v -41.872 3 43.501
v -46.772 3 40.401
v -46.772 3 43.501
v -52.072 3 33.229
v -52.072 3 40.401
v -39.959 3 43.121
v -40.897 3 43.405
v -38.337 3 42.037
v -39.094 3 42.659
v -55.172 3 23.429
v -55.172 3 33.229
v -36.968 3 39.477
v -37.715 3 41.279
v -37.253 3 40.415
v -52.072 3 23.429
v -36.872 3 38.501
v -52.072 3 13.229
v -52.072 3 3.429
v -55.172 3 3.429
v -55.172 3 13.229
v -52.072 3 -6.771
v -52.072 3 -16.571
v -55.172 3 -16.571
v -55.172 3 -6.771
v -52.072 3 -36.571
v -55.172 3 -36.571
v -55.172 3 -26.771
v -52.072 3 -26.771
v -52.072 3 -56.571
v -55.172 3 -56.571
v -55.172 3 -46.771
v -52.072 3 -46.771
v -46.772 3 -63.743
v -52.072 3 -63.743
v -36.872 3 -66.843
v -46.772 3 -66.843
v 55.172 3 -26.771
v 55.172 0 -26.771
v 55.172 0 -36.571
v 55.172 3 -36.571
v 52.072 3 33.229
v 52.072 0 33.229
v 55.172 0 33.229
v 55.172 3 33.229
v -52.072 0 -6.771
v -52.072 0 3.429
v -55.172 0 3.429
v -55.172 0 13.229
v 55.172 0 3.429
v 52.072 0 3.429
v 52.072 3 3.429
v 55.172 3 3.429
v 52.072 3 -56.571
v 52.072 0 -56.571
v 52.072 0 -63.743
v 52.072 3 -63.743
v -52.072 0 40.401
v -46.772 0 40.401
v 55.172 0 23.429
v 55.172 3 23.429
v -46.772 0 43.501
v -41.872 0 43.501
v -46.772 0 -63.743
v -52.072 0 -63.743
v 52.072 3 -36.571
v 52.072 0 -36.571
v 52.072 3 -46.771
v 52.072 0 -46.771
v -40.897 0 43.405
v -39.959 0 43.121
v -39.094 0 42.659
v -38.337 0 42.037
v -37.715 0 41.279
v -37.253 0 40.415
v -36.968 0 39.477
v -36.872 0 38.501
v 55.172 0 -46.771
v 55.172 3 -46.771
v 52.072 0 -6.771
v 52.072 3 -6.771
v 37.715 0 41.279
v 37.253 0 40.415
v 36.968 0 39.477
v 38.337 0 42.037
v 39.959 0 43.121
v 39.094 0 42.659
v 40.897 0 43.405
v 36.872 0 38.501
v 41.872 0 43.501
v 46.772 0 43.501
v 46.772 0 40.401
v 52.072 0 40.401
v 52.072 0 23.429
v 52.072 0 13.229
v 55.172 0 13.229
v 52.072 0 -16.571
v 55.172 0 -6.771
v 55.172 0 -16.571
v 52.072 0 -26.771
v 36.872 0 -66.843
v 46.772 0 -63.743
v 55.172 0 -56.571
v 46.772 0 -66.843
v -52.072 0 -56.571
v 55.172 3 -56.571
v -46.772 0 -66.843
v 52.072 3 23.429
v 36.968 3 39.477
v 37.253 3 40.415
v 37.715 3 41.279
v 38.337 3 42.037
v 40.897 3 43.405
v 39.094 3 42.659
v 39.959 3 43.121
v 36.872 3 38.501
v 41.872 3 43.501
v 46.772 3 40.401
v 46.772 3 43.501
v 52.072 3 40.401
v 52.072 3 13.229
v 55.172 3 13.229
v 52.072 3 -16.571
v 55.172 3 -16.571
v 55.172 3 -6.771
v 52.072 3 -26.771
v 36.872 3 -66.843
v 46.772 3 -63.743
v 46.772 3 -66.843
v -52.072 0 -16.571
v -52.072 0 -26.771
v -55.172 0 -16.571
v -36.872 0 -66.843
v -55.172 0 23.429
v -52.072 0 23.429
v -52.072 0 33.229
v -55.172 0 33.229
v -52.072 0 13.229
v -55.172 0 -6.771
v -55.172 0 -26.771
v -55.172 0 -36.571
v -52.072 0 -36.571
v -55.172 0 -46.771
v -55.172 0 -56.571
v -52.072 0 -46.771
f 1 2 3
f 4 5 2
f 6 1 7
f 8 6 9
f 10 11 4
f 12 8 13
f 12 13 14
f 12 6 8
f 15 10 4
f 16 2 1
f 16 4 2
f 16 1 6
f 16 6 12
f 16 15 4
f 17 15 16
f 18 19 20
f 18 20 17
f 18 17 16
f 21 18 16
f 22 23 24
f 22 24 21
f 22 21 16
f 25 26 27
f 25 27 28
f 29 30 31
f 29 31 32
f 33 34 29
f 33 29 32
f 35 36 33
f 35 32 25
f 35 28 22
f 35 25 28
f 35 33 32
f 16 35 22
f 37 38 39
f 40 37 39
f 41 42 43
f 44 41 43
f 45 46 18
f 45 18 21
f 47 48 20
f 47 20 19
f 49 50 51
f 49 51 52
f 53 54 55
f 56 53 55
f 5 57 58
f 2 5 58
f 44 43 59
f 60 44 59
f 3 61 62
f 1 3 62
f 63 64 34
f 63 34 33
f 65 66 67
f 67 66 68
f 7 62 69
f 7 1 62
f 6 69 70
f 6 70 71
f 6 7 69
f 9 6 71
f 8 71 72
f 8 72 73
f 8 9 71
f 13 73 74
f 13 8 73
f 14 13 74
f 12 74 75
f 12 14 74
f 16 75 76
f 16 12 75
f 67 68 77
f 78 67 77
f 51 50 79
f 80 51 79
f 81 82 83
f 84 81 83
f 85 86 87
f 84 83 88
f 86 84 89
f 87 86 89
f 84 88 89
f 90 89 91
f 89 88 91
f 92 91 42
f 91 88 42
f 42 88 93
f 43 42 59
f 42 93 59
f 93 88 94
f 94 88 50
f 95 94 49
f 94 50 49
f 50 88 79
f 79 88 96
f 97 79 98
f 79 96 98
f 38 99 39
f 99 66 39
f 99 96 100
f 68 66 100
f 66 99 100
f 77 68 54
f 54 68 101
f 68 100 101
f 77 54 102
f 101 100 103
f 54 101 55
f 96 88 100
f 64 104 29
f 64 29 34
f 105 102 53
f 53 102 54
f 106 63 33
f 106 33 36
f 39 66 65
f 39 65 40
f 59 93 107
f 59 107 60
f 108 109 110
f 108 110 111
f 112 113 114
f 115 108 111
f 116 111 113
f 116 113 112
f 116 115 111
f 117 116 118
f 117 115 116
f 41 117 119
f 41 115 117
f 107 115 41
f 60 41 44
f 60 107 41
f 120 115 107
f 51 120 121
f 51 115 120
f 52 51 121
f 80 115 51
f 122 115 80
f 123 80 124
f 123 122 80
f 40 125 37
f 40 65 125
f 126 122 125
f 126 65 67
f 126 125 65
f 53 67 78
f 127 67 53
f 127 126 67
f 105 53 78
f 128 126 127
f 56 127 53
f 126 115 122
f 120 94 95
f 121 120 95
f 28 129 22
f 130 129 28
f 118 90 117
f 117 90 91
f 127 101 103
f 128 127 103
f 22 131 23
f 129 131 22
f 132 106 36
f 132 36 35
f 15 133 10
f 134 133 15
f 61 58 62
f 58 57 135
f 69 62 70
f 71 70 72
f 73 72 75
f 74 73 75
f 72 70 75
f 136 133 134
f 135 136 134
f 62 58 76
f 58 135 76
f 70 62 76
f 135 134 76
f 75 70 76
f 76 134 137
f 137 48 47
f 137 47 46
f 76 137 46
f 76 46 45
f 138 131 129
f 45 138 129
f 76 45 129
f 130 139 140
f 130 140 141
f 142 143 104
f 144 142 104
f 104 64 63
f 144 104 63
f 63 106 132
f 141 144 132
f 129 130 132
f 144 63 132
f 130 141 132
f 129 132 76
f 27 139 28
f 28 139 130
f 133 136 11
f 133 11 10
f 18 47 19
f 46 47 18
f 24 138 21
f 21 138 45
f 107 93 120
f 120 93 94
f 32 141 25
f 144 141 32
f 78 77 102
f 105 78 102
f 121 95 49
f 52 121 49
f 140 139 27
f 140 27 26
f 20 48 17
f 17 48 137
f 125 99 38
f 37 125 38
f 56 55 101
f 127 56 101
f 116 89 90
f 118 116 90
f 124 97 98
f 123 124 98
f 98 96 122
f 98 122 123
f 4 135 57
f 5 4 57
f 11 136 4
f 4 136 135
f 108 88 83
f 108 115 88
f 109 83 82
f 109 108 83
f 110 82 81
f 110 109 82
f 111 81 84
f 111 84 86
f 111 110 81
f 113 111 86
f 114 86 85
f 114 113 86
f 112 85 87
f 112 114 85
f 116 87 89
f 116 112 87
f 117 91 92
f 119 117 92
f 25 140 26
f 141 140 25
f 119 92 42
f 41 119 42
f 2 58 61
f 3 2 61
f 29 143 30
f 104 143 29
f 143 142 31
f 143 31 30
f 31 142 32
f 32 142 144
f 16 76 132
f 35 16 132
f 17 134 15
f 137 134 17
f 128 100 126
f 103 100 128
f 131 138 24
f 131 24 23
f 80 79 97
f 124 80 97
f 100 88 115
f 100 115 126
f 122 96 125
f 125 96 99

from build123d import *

# Parameters (mm, degrees)
SKETCH1_W             = 18.3
SKETCH1_H             = 110.344434204
BOSS_EXTRUDE1_DEPTH   = 3
BOSS_EXTRUDE1_2_DEPTH = 3
FILLET1_R             = 5
FILLET2_R             = 5
SKETCH3_W             = 3.2
SKETCH3_H             = 10.2
CUT_EXTRUDE1_DEPTH    = 4
SKETCH4_W             = 3.2
SKETCH4_H             = 10.2
CUT_EXTRUDE2_DEPTH    = 4


with BuildPart() as part:
    # Sketch1 → Boss-Extrude1 (new body)
    with BuildSketch(Plane(origin=(0, 0, 0), x_dir=(1, 0, 0), z_dir=(0, 1, 0))):
        with Locations((-46.022217102, 11.670773756)):
            Rectangle(SKETCH1_W, SKETCH1_H)
    extrude(amount=BOSS_EXTRUDE1_DEPTH)

    # Fillet1
    fillet1_edges = [part.edges().sort_by_distance(p)[0] for p in [
        (-36.872217102, 1.5, 43.501443346),
    ]]
    fillet(fillet1_edges, radius=FILLET1_R)

    # Sketch3 → Cut-Extrude1 (cut, through all)
    with BuildSketch(Plane(origin=(0, 0, 0), x_dir=(1, 0, 0), z_dir=(0, 1, 0))):
        Polygon((-52.072217102, -40.401443346), (-46.772217102, -40.401443346), (-46.772217102, -43.601443346), (-55.272217102, -43.601443346), (-55.272217102, -33.229226244), (-52.072217102, -33.229226244), align=None)
        Polygon((-46.772217102, 63.742990858), (-46.772217102, 66.942990858), (-55.272217102, 66.942990858), (-55.272217102, 56.570773756), (-52.072217102, 56.570773756), (-52.072217102, 63.742990858), align=None)
        with Locations((-53.672217102, -18.329226244)):
            Rectangle(SKETCH3_W, SKETCH3_H)
        with Locations((-53.672217102, 1.670773756)):
            Rectangle(SKETCH3_W, SKETCH3_H)
        with Locations((-53.672217102, 21.670773756)):
            Rectangle(SKETCH3_W, SKETCH3_H)
        with Locations((-53.672217102, 41.670773756)):
            Rectangle(SKETCH3_W, SKETCH3_H)
    extrude(amount=CUT_EXTRUDE1_DEPTH, mode=Mode.SUBTRACT)


with BuildPart() as body_2:
    # Sketch1 → Boss-Extrude1 2 (new body)
    with BuildSketch(Plane(origin=(0, 0, 0), x_dir=(1, 0, 0), z_dir=(0, 1, 0))):
        with Locations((46.022217102, 11.670773756)):
            Rectangle(SKETCH1_W, SKETCH1_H)
    extrude(amount=BOSS_EXTRUDE1_2_DEPTH)

    # Fillet2
    fillet2_edges = [body_2.edges().sort_by_distance(p)[0] for p in [
        (36.872217102, 1.5, 43.501443346),
    ]]
    fillet(fillet2_edges, radius=FILLET2_R)

    # Sketch4 → Cut-Extrude2 (cut, through all)
    with BuildSketch(Plane(origin=(0, 0, 0), x_dir=(1, 0, 0), z_dir=(0, 1, 0))):
        with Locations((53.672217102, 41.670773756)):
            Rectangle(SKETCH4_W, SKETCH4_H)
        with Locations((53.672217102, 21.670773756)):
            Rectangle(SKETCH4_W, SKETCH4_H)
        with Locations((53.672217102, -18.329226244)):
            Rectangle(SKETCH4_W, SKETCH4_H)
        with Locations((53.672217102, 1.670773756)):
            Rectangle(SKETCH4_W, SKETCH4_H)
        Polygon((52.072217102, -40.401443346), (52.072217102, -33.229226244), (55.272217102, -33.229226244), (55.272217102, -43.601443346), (46.772217102, -43.601443346), (46.772217102, -40.401443346), align=None)
        Polygon((52.072217102, 63.742990858), (46.772217102, 63.742990858), (46.772217102, 66.942990858), (55.272217102, 66.942990858), (55.272217102, 56.570773756), (52.072217102, 56.570773756), align=None)
    extrude(amount=CUT_EXTRUDE2_DEPTH, mode=Mode.SUBTRACT)


solid = Compound([part.part, body_2.part])
